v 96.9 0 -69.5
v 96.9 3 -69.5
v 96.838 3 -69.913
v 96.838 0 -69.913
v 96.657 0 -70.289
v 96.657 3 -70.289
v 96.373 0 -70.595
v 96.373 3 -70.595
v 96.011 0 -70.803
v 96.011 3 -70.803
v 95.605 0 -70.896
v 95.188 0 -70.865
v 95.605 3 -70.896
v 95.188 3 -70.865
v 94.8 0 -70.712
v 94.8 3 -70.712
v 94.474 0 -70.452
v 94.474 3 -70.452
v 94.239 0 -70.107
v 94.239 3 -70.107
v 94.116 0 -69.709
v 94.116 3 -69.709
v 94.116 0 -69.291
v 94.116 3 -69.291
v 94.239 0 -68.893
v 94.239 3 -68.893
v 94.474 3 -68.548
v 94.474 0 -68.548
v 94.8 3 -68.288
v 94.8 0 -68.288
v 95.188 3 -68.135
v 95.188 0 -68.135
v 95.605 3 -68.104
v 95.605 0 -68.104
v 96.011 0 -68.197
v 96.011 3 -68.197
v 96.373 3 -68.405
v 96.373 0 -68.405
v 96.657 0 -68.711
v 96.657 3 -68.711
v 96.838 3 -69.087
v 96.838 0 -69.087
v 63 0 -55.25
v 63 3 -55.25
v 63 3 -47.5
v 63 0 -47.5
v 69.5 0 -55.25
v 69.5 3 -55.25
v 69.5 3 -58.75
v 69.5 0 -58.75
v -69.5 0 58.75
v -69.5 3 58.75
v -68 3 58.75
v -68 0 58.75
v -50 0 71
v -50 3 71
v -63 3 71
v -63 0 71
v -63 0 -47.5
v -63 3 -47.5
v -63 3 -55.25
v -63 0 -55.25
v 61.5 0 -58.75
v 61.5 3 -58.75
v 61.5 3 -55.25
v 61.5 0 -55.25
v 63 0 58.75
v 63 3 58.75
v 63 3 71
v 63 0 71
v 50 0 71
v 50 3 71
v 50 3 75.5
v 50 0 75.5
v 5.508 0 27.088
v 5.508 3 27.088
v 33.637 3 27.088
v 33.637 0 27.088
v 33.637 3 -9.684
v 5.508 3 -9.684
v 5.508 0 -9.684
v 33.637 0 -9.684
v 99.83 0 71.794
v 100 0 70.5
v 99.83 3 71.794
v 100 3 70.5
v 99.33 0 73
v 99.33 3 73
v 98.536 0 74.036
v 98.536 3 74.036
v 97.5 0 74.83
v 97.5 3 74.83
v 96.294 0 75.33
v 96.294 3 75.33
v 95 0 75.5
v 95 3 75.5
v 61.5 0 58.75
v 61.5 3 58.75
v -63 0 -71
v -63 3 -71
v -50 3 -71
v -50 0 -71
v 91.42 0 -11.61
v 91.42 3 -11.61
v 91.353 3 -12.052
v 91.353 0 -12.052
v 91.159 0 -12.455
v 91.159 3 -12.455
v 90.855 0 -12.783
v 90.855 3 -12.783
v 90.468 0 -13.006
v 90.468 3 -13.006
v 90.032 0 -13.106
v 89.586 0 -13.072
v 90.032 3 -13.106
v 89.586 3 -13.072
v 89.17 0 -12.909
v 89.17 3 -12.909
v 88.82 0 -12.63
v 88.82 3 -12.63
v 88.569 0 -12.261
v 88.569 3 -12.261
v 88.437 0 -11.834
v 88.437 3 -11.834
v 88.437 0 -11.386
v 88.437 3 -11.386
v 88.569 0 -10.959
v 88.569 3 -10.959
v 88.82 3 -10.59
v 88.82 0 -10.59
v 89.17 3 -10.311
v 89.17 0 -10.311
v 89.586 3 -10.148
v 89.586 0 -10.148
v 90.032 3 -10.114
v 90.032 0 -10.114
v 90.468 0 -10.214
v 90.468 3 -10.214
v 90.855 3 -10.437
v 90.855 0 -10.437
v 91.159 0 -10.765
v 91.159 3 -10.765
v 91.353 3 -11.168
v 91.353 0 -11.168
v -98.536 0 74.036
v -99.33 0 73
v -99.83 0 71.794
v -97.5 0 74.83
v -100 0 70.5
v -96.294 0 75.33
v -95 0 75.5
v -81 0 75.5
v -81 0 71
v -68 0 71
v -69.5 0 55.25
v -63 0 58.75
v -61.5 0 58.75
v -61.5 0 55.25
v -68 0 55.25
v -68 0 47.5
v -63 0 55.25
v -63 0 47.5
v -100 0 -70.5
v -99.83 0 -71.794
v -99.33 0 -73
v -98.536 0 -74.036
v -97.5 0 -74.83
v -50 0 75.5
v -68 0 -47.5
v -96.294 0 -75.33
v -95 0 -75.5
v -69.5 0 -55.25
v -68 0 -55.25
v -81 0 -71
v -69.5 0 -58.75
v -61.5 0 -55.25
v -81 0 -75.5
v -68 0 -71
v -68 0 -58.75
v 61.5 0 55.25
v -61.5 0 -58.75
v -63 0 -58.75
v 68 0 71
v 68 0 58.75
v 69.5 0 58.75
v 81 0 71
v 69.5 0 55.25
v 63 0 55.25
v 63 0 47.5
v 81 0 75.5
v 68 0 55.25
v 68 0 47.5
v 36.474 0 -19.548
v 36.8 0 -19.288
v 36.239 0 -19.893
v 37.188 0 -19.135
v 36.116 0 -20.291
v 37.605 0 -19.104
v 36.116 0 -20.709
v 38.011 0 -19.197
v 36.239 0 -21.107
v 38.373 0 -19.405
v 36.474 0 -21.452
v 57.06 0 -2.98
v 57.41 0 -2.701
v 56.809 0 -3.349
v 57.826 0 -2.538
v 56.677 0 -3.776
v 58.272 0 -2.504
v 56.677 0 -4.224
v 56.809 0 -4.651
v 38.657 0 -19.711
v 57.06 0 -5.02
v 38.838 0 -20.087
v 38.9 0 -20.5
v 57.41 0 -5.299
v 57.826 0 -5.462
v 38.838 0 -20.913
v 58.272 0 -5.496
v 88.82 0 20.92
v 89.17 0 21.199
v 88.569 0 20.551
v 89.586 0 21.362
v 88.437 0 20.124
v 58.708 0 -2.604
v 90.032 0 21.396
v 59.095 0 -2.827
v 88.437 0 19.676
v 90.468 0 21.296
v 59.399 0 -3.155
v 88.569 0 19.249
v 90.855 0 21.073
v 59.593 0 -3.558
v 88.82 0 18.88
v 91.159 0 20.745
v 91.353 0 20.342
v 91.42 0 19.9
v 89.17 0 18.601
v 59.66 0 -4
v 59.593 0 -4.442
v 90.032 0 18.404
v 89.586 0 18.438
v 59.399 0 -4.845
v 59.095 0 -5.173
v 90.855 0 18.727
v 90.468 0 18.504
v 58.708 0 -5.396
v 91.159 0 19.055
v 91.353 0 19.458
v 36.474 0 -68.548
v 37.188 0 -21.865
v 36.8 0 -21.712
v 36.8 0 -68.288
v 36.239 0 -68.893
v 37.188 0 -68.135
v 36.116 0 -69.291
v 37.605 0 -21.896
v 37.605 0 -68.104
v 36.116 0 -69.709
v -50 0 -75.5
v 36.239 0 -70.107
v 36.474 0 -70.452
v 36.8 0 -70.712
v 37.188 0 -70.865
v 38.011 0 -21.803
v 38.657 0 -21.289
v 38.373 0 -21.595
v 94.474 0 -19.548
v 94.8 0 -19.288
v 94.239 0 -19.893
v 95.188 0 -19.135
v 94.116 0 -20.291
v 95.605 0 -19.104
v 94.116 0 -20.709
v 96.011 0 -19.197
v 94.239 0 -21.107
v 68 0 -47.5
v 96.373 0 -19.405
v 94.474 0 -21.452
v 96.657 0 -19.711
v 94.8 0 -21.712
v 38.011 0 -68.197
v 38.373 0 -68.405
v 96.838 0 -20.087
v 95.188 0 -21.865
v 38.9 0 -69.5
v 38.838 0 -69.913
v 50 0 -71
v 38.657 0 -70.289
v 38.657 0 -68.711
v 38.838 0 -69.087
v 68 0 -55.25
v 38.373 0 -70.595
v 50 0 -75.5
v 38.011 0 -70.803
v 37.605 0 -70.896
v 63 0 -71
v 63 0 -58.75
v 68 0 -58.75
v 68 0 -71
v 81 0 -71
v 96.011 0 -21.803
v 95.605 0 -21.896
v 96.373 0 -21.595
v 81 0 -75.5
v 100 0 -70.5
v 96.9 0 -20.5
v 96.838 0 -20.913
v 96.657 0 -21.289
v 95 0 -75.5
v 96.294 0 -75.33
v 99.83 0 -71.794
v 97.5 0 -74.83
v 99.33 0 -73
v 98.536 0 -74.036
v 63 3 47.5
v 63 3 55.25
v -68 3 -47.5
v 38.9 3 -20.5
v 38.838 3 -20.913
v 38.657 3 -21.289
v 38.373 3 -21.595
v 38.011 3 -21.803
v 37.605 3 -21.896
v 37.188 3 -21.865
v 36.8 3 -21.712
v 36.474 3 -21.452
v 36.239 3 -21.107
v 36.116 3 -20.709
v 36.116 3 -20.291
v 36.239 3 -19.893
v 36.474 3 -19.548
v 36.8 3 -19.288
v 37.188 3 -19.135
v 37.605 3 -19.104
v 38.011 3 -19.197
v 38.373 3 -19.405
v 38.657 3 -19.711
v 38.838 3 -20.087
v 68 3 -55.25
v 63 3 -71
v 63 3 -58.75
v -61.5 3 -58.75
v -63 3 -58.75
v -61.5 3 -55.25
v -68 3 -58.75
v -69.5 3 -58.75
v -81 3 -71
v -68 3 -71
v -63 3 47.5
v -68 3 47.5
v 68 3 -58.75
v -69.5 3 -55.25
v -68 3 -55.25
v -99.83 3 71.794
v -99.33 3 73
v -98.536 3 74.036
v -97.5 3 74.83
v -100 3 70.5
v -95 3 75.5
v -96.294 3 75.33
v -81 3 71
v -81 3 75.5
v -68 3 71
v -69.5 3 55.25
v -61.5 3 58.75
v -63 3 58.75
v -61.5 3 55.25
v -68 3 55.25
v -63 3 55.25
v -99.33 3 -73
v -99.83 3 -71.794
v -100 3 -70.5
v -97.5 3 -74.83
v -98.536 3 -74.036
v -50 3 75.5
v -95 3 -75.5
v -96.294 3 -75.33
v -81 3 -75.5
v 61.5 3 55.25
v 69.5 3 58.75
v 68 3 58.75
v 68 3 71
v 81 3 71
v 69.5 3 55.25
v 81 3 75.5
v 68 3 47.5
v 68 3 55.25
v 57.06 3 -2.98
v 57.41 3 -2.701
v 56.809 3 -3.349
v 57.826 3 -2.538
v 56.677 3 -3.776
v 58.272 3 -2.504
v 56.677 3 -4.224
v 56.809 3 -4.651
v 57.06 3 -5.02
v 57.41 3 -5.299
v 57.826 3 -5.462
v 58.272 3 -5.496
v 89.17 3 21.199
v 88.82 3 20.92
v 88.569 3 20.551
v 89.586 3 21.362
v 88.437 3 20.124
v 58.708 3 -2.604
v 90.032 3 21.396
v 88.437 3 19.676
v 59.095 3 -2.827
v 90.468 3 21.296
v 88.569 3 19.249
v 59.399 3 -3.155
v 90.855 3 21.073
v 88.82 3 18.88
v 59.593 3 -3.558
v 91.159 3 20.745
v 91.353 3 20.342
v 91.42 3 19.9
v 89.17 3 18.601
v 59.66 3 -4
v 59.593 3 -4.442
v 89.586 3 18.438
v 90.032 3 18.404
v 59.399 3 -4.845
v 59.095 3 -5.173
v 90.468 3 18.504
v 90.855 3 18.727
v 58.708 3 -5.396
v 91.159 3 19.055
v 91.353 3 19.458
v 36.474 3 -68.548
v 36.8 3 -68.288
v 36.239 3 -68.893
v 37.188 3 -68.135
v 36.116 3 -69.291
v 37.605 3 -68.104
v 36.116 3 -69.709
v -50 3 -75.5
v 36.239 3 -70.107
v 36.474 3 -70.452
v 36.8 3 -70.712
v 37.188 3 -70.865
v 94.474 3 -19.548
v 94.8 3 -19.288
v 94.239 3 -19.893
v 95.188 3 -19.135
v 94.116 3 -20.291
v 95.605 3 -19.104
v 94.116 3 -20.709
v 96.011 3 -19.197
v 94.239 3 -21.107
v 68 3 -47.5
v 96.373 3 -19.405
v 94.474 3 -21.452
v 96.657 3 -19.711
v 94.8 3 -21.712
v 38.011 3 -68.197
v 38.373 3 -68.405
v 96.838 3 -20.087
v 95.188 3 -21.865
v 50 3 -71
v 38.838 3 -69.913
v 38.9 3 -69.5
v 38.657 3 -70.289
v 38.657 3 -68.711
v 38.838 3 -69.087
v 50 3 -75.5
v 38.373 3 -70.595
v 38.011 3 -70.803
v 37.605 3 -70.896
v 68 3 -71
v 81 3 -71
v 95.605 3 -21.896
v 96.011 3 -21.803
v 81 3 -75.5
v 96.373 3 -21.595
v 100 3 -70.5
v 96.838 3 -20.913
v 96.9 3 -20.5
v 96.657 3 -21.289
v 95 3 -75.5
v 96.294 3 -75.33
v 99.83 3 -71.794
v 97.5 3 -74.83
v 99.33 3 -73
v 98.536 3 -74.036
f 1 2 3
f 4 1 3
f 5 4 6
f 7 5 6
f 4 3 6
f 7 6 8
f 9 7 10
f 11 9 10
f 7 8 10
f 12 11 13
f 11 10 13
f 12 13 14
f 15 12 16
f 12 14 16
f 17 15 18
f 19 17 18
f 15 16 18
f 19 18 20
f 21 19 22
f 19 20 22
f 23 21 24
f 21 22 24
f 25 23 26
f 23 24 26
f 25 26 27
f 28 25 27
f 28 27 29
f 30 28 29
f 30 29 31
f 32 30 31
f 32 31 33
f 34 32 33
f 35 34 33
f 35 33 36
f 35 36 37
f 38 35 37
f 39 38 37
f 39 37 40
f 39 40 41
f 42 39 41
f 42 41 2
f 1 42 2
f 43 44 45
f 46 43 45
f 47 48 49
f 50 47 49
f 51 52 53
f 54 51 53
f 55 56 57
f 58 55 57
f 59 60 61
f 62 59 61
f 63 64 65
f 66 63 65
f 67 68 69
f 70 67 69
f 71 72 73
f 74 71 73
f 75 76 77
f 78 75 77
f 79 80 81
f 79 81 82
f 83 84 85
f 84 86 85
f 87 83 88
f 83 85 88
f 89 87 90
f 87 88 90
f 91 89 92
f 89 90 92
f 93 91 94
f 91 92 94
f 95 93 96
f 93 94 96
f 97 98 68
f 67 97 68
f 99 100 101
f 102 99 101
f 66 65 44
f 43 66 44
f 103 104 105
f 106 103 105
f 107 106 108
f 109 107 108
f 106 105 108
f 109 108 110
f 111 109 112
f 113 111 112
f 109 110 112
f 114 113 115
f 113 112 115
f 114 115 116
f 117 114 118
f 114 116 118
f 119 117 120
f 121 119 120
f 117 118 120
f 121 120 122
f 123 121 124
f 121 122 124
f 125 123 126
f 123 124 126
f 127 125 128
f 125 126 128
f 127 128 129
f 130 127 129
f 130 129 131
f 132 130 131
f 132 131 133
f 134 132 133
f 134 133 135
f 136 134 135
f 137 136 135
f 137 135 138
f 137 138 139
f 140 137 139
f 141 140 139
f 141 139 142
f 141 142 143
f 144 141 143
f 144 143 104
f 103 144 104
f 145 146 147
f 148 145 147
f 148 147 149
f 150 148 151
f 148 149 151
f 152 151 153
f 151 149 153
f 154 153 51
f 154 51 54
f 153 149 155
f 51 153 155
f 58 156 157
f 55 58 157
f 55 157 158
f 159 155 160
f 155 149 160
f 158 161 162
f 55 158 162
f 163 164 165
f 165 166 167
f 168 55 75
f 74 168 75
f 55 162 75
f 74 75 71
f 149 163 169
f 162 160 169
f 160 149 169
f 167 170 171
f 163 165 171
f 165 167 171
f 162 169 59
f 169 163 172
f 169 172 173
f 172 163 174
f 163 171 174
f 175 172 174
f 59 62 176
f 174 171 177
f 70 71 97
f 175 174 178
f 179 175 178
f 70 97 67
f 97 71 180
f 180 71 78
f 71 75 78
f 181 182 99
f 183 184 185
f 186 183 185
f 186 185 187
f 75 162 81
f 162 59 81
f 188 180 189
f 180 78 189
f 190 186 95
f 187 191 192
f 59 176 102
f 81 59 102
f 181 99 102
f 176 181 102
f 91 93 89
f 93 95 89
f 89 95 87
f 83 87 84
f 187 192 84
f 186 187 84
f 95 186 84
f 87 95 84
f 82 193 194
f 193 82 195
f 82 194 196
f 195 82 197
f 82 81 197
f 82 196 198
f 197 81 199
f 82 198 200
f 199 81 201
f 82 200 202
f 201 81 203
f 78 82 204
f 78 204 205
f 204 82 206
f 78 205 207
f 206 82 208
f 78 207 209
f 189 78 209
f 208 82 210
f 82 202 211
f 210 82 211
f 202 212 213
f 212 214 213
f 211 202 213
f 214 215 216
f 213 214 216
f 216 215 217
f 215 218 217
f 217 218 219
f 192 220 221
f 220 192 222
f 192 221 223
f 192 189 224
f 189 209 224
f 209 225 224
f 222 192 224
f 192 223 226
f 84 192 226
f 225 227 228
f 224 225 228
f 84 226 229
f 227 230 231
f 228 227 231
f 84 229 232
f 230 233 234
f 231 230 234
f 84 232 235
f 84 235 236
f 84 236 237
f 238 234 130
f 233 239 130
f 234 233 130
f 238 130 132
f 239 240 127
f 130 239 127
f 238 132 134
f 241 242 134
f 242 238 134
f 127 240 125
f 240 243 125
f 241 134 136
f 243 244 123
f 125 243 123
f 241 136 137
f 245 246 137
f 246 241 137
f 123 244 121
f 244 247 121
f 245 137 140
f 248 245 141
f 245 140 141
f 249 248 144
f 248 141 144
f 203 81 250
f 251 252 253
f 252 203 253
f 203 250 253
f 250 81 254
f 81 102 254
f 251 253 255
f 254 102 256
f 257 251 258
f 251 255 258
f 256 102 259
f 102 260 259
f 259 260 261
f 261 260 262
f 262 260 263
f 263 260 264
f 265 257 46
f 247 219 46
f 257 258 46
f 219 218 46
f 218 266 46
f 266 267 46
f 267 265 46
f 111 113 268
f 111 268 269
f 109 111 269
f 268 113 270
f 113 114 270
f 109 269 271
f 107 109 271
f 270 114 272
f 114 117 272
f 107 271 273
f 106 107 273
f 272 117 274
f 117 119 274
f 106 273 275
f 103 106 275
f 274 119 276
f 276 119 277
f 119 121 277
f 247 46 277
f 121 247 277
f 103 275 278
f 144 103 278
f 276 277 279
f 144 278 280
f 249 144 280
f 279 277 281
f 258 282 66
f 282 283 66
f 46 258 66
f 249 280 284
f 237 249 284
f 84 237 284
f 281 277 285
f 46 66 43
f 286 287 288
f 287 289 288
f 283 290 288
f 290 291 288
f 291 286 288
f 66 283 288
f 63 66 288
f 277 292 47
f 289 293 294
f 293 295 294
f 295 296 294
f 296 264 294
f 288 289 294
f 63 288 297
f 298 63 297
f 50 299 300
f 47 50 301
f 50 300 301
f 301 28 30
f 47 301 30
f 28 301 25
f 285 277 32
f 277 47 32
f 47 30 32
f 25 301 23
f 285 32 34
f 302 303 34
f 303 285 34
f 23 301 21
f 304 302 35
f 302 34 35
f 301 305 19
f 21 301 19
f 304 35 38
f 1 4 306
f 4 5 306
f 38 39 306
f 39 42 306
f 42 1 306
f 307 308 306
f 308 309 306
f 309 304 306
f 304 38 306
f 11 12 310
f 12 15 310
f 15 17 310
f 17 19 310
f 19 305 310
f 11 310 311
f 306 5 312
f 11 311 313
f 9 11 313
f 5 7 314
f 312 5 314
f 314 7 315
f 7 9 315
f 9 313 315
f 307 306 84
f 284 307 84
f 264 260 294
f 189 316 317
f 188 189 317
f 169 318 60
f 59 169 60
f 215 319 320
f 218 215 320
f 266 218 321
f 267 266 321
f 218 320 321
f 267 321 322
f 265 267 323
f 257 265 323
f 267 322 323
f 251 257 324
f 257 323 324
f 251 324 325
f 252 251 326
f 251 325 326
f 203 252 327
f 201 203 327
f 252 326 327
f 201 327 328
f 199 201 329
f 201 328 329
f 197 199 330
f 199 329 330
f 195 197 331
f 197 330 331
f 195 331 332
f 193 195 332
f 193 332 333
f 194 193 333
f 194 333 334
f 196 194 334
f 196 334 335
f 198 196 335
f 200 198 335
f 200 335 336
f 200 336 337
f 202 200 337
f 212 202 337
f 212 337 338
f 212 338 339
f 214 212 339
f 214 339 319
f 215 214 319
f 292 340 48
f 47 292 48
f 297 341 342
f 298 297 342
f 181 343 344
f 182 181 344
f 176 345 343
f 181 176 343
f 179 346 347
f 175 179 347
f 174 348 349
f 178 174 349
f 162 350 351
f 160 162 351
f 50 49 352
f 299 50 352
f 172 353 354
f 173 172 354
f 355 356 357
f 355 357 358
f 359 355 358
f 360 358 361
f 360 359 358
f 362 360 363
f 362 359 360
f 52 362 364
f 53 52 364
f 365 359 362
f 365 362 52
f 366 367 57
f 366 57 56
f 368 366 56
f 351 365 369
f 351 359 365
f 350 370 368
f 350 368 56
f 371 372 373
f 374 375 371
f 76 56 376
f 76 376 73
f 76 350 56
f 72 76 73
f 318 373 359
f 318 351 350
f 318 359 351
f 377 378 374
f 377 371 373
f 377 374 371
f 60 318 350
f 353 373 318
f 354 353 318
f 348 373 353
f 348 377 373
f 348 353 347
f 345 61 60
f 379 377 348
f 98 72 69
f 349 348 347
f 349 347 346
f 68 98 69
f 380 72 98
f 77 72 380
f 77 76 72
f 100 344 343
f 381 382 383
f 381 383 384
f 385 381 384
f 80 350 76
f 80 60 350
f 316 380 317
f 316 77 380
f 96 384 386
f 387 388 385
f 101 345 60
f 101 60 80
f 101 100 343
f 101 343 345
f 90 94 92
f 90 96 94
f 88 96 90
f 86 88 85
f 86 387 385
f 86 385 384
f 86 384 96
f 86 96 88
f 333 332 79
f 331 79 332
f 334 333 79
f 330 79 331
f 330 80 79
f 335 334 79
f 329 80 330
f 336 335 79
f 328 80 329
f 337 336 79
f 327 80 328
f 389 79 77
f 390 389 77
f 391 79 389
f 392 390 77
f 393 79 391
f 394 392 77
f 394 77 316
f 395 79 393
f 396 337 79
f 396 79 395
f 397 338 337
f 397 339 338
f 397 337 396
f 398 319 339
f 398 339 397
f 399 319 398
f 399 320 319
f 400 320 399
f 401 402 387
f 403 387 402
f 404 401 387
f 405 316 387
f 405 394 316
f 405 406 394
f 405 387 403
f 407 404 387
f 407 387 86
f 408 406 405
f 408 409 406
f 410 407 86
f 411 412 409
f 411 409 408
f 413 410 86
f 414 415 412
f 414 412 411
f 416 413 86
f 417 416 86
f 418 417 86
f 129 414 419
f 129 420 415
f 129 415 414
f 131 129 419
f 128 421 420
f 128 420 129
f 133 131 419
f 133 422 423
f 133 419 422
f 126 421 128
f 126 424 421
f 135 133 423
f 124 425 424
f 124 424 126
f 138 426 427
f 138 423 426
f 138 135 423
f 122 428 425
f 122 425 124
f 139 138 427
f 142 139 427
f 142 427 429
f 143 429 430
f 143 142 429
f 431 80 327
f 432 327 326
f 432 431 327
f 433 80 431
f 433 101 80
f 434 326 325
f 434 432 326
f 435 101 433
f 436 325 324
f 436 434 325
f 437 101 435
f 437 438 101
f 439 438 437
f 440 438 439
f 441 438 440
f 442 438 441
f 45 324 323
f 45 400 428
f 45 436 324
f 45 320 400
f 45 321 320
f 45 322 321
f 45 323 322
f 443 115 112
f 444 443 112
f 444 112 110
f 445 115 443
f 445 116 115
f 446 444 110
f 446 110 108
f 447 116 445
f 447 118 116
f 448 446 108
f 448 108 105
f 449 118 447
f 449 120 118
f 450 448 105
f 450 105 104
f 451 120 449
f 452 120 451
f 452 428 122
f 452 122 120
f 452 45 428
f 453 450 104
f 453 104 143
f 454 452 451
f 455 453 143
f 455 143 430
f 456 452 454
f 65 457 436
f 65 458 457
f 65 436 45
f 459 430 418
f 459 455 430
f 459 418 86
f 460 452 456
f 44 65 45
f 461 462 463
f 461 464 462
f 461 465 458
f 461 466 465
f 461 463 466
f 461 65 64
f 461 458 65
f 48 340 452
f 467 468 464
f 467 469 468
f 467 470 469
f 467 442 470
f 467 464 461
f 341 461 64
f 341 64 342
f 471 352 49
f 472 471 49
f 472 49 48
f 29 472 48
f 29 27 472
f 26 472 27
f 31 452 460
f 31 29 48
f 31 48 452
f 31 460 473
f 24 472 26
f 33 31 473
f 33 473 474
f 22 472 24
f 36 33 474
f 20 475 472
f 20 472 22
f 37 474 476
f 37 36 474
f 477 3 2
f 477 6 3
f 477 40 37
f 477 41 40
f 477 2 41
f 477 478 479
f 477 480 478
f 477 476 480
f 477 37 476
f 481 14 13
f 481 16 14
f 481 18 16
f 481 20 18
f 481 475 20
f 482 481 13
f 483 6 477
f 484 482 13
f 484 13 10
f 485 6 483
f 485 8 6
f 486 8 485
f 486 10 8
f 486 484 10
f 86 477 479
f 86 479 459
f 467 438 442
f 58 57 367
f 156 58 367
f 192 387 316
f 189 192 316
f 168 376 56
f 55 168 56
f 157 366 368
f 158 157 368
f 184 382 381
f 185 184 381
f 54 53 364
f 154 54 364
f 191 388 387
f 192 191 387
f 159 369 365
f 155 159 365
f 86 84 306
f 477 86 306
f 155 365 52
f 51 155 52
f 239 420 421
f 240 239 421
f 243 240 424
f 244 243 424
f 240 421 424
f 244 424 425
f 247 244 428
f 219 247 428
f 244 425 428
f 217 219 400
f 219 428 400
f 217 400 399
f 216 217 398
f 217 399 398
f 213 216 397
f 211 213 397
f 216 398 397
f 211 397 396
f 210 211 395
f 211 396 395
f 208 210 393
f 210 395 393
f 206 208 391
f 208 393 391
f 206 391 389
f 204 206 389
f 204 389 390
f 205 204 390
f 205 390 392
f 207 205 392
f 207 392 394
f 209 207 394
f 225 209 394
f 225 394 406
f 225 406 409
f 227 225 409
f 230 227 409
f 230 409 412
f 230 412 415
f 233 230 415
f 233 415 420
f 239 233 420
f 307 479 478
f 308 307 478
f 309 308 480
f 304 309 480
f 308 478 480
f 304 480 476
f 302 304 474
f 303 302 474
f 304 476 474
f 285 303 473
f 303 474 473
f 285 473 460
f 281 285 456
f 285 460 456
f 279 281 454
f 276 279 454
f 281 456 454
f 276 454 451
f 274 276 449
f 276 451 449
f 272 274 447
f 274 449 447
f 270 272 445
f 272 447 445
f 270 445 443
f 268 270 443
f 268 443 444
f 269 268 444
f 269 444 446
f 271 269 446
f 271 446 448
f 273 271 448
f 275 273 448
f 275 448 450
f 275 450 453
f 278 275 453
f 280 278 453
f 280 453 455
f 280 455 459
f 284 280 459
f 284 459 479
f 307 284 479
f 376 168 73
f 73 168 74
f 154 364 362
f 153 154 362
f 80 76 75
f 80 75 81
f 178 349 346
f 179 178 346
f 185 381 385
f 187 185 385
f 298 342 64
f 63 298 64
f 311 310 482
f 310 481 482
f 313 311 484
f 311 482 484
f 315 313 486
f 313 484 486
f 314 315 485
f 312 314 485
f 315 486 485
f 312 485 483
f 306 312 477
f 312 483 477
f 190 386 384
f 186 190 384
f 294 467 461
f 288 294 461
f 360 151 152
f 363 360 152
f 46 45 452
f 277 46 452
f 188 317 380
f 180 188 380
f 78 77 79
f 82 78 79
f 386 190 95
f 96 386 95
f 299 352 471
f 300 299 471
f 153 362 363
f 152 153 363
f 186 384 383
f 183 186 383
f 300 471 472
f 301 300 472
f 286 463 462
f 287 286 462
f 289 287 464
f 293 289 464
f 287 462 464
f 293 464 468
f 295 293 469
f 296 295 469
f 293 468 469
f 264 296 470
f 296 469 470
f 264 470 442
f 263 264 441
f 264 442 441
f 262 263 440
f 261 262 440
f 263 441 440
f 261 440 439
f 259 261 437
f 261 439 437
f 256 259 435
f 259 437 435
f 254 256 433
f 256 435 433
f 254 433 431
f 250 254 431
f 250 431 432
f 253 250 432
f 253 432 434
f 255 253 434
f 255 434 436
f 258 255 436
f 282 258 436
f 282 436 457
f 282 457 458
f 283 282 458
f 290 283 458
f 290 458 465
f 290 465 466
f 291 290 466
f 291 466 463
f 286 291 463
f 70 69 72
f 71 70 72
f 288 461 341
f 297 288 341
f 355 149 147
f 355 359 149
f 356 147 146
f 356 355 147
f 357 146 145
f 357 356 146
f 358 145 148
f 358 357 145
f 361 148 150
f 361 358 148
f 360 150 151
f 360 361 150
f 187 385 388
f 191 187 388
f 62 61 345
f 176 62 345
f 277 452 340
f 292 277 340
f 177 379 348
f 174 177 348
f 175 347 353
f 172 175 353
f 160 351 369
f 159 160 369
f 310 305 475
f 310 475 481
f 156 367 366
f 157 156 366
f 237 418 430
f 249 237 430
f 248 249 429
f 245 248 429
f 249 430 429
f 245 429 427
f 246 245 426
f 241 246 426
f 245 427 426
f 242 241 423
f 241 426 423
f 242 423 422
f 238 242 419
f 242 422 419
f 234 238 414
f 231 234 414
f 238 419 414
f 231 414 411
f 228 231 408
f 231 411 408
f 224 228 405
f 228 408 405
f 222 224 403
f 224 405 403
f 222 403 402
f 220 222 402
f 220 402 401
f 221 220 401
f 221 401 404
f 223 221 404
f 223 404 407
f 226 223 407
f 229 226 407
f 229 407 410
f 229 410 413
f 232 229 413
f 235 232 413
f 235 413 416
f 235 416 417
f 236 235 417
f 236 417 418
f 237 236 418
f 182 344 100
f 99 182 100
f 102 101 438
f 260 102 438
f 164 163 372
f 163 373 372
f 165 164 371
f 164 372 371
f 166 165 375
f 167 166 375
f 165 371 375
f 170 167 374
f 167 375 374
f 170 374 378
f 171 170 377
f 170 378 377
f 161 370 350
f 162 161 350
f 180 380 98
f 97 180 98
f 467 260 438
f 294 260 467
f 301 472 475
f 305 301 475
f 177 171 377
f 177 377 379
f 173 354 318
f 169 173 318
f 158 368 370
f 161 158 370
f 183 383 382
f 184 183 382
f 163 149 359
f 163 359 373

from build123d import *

# Parameters (mm, degrees)
SKETCH1_W           = 200
SKETCH1_H           = 151
BOSS_EXTRUDE1_DEPTH = 3
SKETCH2_W           = 28.1297743
SKETCH2_H           = 36.772110208
SKETCH2_R           = 1.5
SKETCH2_R_2         = 1.4
CUT_EXTRUDE2_DEPTH  = 4
FILLET1_R           = 5


with BuildPart() as part:
    # Sketch1 → Boss-Extrude1 (new body)
    with BuildSketch(Plane(origin=(0, 0, 0), x_dir=(1, 0, 0), z_dir=(0, 1, 0))):
        Rectangle(SKETCH1_W, SKETCH1_H)
    extrude(amount=BOSS_EXTRUDE1_DEPTH)

    # Sketch2 → Cut-Extrude2 (cut, through all)
    with BuildSketch(Plane(origin=(0, 3, 0), x_dir=(1, 0, 0), z_dir=(0, 1, 0))):
        Polygon((-50, 75.5), (-81, 75.5), (-81, 71), (-68, 71), (-68, 58.75), (-69.5, 58.75), (-69.5, 55.25), (-68, 55.25), (-68, 47.5), (-63, 47.5), (-63, 55.25), (-61.5, 55.25), (-61.5, 58.75), (-63, 58.75), (-63, 71), (-50, 71), align=None)
        Polygon((50, 71), (63, 71), (63, 58.75), (61.5, 58.75), (61.5, 55.25), (63, 55.25), (63, 47.5), (68, 47.5), (68, 55.25), (69.5, 55.25), (69.5, 58.75), (68, 58.75), (68, 71), (81, 71), (81, 75.5), (50, 75.5), align=None)
        Polygon((50, -75.5), (81, -75.5), (81, -71), (68, -71), (68, -58.75), (69.5, -58.75), (69.5, -55.25), (68, -55.25), (68, -47.5), (63, -47.5), (63, -55.25), (61.5, -55.25), (61.5, -58.75), (63, -58.75), (63, -71), (50, -71), align=None)
        Polygon((-50, -71), (-63, -71), (-63, -58.75), (-61.5, -58.75), (-61.5, -55.25), (-63, -55.25), (-63, -47.5), (-68, -47.5), (-68, -55.25), (-69.5, -55.25), (-69.5, -58.75), (-68, -58.75), (-68, -71), (-81, -71), (-81, -75.5), (-50, -75.5), align=None)
        with Locations((19.572588651, -8.701882989)):
            Rectangle(SKETCH2_W, SKETCH2_H)
        with Locations((89.92, -19.9)):
            Circle(SKETCH2_R)
        with Locations((89.92, 11.61)):
            Circle(SKETCH2_R)
        with Locations((58.16, 4)):
            Circle(SKETCH2_R)
        with Locations((95.5, 20.5)):
            Circle(SKETCH2_R_2)
        with Locations((37.5, 20.5)):
            Circle(SKETCH2_R_2)
        with Locations((37.5, 69.5)):
            Circle(SKETCH2_R_2)
        with Locations((95.5, 69.5)):
            Circle(SKETCH2_R_2)
    extrude(amount=-CUT_EXTRUDE2_DEPTH, mode=Mode.SUBTRACT)

    # Fillet1
    fillet1_edges = [part.edges().sort_by_distance(p)[0] for p in [
        (100, 1.5, 75.5),
        (-100, 1.5, 75.5),
        (-100, 1.5, -75.5),
        (100, 1.5, -75.5),
    ]]
    fillet(fillet1_edges, radius=FILLET1_R)


solid = part.part
